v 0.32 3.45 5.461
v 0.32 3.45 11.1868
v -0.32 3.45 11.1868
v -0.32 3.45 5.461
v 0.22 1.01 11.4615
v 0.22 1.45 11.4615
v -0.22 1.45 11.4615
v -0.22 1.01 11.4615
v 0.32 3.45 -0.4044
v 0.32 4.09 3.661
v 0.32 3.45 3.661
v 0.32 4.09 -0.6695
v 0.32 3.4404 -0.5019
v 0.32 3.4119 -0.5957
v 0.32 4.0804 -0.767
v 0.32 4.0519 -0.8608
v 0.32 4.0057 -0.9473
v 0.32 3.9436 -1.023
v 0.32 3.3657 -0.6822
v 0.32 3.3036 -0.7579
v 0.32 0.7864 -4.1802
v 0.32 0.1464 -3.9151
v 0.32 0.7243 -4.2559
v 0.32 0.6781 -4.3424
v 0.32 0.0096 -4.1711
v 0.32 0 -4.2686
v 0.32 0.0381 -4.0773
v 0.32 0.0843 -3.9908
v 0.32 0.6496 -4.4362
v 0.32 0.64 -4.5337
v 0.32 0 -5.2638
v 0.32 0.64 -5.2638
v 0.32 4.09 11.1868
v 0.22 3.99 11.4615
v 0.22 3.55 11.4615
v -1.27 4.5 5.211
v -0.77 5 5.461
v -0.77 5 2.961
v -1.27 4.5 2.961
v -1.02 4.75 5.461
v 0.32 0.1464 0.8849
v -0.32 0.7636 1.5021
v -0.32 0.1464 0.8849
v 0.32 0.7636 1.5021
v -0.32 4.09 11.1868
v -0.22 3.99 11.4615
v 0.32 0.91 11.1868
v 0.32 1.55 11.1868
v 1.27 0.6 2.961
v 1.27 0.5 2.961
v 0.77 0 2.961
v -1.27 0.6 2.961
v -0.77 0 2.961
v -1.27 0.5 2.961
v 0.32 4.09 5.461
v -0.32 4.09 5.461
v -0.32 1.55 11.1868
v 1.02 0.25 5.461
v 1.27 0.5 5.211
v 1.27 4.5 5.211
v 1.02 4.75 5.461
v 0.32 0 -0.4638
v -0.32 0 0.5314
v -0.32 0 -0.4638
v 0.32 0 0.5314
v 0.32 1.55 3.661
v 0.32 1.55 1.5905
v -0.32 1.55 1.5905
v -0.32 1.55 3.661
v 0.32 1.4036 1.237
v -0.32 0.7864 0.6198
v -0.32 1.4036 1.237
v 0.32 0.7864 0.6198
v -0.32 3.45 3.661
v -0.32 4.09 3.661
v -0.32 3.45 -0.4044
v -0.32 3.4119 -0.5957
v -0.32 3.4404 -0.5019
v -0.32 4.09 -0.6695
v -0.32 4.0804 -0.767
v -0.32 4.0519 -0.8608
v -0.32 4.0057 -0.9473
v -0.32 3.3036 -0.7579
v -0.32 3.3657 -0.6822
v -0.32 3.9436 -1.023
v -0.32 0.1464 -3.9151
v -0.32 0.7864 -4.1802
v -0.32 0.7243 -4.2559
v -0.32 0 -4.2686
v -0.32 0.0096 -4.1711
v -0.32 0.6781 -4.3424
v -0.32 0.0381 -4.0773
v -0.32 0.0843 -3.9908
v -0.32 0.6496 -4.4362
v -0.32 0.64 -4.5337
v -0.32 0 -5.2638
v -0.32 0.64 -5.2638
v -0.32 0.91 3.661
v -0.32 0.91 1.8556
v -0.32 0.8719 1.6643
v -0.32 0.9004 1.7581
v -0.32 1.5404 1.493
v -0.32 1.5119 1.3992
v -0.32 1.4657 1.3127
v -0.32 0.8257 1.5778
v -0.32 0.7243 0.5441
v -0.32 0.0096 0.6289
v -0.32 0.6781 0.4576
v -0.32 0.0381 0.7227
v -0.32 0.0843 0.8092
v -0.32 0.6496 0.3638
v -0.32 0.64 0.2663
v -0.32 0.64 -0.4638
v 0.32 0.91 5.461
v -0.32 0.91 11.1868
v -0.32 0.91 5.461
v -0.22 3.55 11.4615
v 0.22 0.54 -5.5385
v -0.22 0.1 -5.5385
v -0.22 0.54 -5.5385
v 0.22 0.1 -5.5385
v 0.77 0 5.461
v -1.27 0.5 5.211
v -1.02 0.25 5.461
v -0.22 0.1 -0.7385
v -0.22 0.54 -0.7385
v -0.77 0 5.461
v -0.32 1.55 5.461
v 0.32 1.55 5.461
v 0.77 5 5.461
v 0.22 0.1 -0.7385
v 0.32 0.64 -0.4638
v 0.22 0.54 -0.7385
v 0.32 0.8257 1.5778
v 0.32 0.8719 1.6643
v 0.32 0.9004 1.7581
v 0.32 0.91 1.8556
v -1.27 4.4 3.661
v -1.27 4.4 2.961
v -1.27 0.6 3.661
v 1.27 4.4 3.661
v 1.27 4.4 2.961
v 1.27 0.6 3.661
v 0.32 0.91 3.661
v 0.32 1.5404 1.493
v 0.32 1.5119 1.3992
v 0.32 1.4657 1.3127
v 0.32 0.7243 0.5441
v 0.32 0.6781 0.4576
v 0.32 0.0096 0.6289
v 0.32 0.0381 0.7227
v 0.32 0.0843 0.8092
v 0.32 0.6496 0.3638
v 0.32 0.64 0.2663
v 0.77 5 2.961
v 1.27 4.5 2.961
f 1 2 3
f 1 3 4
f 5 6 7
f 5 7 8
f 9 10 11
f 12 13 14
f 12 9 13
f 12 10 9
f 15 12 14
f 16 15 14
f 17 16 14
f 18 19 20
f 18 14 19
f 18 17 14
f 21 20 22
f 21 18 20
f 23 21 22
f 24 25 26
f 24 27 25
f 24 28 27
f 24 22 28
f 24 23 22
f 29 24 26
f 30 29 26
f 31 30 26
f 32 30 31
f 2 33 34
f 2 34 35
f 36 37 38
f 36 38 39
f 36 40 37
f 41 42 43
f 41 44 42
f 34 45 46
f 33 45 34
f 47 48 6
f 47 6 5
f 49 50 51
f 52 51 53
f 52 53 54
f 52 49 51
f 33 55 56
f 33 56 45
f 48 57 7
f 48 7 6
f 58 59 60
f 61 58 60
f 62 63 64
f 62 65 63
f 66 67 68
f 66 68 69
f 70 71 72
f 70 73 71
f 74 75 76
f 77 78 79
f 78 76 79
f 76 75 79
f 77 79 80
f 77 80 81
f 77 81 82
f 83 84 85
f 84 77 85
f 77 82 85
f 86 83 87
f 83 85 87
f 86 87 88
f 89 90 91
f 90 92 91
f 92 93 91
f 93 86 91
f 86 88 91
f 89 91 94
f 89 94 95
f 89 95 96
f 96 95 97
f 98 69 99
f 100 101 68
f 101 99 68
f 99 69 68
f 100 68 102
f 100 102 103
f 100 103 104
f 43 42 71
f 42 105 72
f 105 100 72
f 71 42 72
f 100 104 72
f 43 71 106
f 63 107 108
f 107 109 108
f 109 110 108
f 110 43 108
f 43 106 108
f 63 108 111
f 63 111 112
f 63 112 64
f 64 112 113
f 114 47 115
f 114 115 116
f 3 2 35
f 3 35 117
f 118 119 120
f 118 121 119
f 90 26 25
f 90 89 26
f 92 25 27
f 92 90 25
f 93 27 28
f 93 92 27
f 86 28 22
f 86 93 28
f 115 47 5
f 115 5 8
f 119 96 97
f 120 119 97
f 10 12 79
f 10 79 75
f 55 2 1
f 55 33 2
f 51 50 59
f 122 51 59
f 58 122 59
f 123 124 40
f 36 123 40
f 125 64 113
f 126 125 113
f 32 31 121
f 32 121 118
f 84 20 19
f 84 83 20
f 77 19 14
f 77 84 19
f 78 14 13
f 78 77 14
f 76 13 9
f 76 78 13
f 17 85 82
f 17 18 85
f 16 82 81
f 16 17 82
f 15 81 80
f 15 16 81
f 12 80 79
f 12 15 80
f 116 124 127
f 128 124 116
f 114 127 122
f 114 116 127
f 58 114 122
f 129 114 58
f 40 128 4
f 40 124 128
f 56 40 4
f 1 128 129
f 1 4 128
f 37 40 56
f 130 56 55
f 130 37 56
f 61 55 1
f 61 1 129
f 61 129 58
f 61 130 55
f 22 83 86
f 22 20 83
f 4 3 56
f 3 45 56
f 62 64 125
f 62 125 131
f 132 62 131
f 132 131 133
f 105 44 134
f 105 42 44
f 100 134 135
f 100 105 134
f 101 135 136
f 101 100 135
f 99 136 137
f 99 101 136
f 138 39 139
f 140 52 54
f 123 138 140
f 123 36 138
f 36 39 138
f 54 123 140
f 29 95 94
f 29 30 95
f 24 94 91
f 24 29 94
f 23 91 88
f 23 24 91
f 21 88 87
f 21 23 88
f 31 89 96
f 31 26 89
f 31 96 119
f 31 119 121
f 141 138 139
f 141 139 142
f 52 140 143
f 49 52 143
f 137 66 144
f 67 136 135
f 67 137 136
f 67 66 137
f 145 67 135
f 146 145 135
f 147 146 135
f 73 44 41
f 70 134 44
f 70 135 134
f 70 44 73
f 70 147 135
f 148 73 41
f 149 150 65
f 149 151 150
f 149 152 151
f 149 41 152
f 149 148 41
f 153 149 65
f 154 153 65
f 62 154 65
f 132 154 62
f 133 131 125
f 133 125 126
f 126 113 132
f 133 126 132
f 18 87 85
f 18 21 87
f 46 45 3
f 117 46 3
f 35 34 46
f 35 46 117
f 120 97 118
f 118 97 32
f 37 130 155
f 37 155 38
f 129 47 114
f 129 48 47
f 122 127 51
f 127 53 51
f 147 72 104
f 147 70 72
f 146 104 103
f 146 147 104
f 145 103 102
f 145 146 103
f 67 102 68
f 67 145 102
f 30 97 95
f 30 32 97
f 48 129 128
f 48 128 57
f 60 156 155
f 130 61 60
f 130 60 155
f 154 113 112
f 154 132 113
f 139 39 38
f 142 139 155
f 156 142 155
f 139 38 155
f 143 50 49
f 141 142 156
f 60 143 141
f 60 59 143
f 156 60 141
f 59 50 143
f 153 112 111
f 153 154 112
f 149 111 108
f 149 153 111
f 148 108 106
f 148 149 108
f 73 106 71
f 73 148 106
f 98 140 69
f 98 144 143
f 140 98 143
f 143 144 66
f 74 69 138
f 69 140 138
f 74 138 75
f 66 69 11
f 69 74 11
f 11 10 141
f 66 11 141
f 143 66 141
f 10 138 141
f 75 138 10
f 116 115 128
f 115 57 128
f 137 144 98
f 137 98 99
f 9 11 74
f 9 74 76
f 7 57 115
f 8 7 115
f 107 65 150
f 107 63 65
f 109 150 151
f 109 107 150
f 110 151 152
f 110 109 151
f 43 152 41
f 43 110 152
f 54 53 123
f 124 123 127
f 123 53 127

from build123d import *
from OCP.BRepFilletAPI import BRepFilletAPI_MakeChamfer

# Parameters (mm, degrees)
EXTRUDE_1_DEPTH   = 0.32
EXTRUDE_1_2_DEPTH = 0.32
CHAMFER_1_SIZE    = 0.1
CHAMFER_1_SIZE2   = 0.274747742
FILLET_1_R        = 0.5
CHAMFER_2_SIZE    = 0.1
CHAMFER_2_SIZE2   = 0.274747742
FILLET_2_R        = 0.5
SKETCH_2_W        = 2.54
SKETCH_2_H        = 5
EXTRUDE_2_DEPTH   = 1.8
CHAMFER_3_SIZE    = 0.5
CHAMFER_4_SIZE    = 0.25
EXTRUDE_3_DEPTH   = 0.7


with BuildPart() as part:
    # Эскиз1 → Бобышка-Вытянуть1 (new, symmetric)
    with BuildSketch(Plane(origin=(0, 0, 0), x_dir=(0, 0, -1), z_dir=(1, 0, 0))):
        Polygon((-0.7385, 0), (0.7385, 0), (0.7385, 0.64), (-0.47340332, 0.64), (-1.38340332, 1.55), (-11.4615, 1.55), (-11.4615, 0.91), (-1.6485, 0.91), align=None)
    extrude(amount=EXTRUDE_1_DEPTH, both=True)

    # Фаска2: one chamfer whose edges measure the first distance from different faces: ONE call of the kernel's chamfer builder (chamfer() names one face for all edges)
    chamfer_2_edges_1 = [part.edges().sort_by_distance(p)[0] for p in [
        (0.32, 0.32, -0.7385),
        (0, 0, -0.7385),
        (0, 0.64, -0.7385),
        (-0.32, 0.32, -0.7385),
    ]]
    chamfer_2_side_1 = [part.faces().sort_by_distance(p)[0] for p in [
        (0, 0.32, -0.7385),
    ]]
    chamfer_2_edges_2 = [part.edges().sort_by_distance(p)[0] for p in [
        (0, 0.91, 11.4615),
        (0, 1.55, 11.4615),
        (-0.32, 1.23, 11.4615),
        (0.32, 1.23, 11.4615),
    ]]
    chamfer_2_side_2 = [part.faces().sort_by_distance(p)[0] for p in [
        (0, 1.23, 11.4615),
    ]]
    chamfer_2 = BRepFilletAPI_MakeChamfer(part.part.solid().wrapped)
    for e in chamfer_2_edges_1:
        chamfer_2.Add(CHAMFER_2_SIZE, CHAMFER_2_SIZE2, e.wrapped, chamfer_2_side_1[0].wrapped)  # the first distance lies on this face
    for e in chamfer_2_edges_2:
        chamfer_2.Add(CHAMFER_2_SIZE, CHAMFER_2_SIZE2, e.wrapped, chamfer_2_side_2[0].wrapped)  # the first distance lies on this face
    add(Compound.cast(chamfer_2.Shape()), mode=Mode.REPLACE)

    # Скругление2
    fillet_2_edges = [part.edges().sort_by_distance(p)[0] for p in [
        (0, 0, 0.7385),
        (0, 0.91, 1.6485),
        (0, 1.55, 1.38340332),
        (0, 0.64, 0.47340332),
    ]]
    fillet(fillet_2_edges, radius=FILLET_2_R)



with BuildPart() as body_2:
    # Эскиз1 → Extrude 1 2 (new, symmetric)
    with BuildSketch(Plane(origin=(0, 0, 0), x_dir=(0, 0, -1), z_dir=(1, 0, 0))):
        Polygon((4.0615, 0), (5.5385, 0), (5.5385, 0.64), (4.32659668, 0.64), (0.87659668, 4.09), (-11.4615, 4.09), (-11.4615, 3.45), (0.6115, 3.45), align=None)
    extrude(amount=EXTRUDE_1_2_DEPTH, both=True)

    # Фаска1: one chamfer whose edges measure the first distance from different faces: ONE call of the kernel's chamfer builder (chamfer() names one face for all edges)
    chamfer_1_edges_1 = [body_2.edges().sort_by_distance(p)[0] for p in [
        (-0.32, 0.32, -5.5385),
        (0, 0.64, -5.5385),
        (0, 0, -5.5385),
        (0.32, 0.32, -5.5385),
    ]]
    chamfer_1_side_1 = [body_2.faces().sort_by_distance(p)[0] for p in [
        (0, 0.32, -5.5385),
    ]]
    chamfer_1_edges_2 = [body_2.edges().sort_by_distance(p)[0] for p in [
        (0, 3.45, 11.4615),
        (0, 4.09, 11.4615),
        (-0.32, 3.77, 11.4615),
        (0.32, 3.77, 11.4615),
    ]]
    chamfer_1_side_2 = [body_2.faces().sort_by_distance(p)[0] for p in [
        (0, 3.77, 11.4615),
    ]]
    chamfer_1 = BRepFilletAPI_MakeChamfer(body_2.part.solid().wrapped)
    for e in chamfer_1_edges_1:
        chamfer_1.Add(CHAMFER_1_SIZE, CHAMFER_1_SIZE2, e.wrapped, chamfer_1_side_1[0].wrapped)  # the first distance lies on this face
    for e in chamfer_1_edges_2:
        chamfer_1.Add(CHAMFER_1_SIZE, CHAMFER_1_SIZE2, e.wrapped, chamfer_1_side_2[0].wrapped)  # the first distance lies on this face
    add(Compound.cast(chamfer_1.Shape()), mode=Mode.REPLACE)

    # Скругление1
    fillet_1_edges = [body_2.edges().sort_by_distance(p)[0] for p in [
        (0, 3.45, -0.6115),
        (0, 4.09, -0.87659668),
        (0, 0.64, -4.32659668),
        (0, 0, -4.0615),
    ]]
    fillet(fillet_1_edges, radius=FILLET_1_R)


with BuildPart() as part_1:
    add(part.part)

    add(body_2.part)  # Бобышка-Вытянуть2 merges body 2
    # Эскиз2 → Бобышка-Вытянуть2 (add)
    with BuildSketch(Plane.XY.offset(3.661)):
        with Locations((0, 2.5)):
            Rectangle(SKETCH_2_W, SKETCH_2_H)
    extrude(amount=EXTRUDE_2_DEPTH)

    # Фаска3
    chamfer_3_edges = [part_1.edges().sort_by_distance(p)[0] for p in [
        (1.27, 0, 4.561),
        (1.27, 5, 4.561),
        (-1.27, 5, 4.561),
        (-1.27, 0, 4.561),
    ]]
    chamfer(chamfer_3_edges, length=CHAMFER_3_SIZE)

    # Фаска4
    chamfer_4_edges = [part_1.edges().sort_by_distance(p)[0] for p in [
        (-1.27, 2.5, 5.461),
        (1.27, 2.5, 5.461),
    ]]
    chamfer(chamfer_4_edges, length=CHAMFER_4_SIZE)

    # Эскиз3 → Бобышка-Вытянуть3 (add)
    with BuildSketch(Plane(origin=(0, 0, 3.661), x_dir=(-1, 0, 0), z_dir=(0, 0, -1))):
        Polygon((-1.27, 4.5), (-0.77, 5), (0.77, 5), (1.27, 4.5), (1.27, 4.4), (-1.27, 4.4), align=None)
        Polygon((-1.27, 0.6), (-1.27, 0.5), (-0.77, 0), (0.77, 0), (1.27, 0.5), (1.27, 0.6), align=None)
    extrude(amount=EXTRUDE_3_DEPTH)


solid = part_1.part
